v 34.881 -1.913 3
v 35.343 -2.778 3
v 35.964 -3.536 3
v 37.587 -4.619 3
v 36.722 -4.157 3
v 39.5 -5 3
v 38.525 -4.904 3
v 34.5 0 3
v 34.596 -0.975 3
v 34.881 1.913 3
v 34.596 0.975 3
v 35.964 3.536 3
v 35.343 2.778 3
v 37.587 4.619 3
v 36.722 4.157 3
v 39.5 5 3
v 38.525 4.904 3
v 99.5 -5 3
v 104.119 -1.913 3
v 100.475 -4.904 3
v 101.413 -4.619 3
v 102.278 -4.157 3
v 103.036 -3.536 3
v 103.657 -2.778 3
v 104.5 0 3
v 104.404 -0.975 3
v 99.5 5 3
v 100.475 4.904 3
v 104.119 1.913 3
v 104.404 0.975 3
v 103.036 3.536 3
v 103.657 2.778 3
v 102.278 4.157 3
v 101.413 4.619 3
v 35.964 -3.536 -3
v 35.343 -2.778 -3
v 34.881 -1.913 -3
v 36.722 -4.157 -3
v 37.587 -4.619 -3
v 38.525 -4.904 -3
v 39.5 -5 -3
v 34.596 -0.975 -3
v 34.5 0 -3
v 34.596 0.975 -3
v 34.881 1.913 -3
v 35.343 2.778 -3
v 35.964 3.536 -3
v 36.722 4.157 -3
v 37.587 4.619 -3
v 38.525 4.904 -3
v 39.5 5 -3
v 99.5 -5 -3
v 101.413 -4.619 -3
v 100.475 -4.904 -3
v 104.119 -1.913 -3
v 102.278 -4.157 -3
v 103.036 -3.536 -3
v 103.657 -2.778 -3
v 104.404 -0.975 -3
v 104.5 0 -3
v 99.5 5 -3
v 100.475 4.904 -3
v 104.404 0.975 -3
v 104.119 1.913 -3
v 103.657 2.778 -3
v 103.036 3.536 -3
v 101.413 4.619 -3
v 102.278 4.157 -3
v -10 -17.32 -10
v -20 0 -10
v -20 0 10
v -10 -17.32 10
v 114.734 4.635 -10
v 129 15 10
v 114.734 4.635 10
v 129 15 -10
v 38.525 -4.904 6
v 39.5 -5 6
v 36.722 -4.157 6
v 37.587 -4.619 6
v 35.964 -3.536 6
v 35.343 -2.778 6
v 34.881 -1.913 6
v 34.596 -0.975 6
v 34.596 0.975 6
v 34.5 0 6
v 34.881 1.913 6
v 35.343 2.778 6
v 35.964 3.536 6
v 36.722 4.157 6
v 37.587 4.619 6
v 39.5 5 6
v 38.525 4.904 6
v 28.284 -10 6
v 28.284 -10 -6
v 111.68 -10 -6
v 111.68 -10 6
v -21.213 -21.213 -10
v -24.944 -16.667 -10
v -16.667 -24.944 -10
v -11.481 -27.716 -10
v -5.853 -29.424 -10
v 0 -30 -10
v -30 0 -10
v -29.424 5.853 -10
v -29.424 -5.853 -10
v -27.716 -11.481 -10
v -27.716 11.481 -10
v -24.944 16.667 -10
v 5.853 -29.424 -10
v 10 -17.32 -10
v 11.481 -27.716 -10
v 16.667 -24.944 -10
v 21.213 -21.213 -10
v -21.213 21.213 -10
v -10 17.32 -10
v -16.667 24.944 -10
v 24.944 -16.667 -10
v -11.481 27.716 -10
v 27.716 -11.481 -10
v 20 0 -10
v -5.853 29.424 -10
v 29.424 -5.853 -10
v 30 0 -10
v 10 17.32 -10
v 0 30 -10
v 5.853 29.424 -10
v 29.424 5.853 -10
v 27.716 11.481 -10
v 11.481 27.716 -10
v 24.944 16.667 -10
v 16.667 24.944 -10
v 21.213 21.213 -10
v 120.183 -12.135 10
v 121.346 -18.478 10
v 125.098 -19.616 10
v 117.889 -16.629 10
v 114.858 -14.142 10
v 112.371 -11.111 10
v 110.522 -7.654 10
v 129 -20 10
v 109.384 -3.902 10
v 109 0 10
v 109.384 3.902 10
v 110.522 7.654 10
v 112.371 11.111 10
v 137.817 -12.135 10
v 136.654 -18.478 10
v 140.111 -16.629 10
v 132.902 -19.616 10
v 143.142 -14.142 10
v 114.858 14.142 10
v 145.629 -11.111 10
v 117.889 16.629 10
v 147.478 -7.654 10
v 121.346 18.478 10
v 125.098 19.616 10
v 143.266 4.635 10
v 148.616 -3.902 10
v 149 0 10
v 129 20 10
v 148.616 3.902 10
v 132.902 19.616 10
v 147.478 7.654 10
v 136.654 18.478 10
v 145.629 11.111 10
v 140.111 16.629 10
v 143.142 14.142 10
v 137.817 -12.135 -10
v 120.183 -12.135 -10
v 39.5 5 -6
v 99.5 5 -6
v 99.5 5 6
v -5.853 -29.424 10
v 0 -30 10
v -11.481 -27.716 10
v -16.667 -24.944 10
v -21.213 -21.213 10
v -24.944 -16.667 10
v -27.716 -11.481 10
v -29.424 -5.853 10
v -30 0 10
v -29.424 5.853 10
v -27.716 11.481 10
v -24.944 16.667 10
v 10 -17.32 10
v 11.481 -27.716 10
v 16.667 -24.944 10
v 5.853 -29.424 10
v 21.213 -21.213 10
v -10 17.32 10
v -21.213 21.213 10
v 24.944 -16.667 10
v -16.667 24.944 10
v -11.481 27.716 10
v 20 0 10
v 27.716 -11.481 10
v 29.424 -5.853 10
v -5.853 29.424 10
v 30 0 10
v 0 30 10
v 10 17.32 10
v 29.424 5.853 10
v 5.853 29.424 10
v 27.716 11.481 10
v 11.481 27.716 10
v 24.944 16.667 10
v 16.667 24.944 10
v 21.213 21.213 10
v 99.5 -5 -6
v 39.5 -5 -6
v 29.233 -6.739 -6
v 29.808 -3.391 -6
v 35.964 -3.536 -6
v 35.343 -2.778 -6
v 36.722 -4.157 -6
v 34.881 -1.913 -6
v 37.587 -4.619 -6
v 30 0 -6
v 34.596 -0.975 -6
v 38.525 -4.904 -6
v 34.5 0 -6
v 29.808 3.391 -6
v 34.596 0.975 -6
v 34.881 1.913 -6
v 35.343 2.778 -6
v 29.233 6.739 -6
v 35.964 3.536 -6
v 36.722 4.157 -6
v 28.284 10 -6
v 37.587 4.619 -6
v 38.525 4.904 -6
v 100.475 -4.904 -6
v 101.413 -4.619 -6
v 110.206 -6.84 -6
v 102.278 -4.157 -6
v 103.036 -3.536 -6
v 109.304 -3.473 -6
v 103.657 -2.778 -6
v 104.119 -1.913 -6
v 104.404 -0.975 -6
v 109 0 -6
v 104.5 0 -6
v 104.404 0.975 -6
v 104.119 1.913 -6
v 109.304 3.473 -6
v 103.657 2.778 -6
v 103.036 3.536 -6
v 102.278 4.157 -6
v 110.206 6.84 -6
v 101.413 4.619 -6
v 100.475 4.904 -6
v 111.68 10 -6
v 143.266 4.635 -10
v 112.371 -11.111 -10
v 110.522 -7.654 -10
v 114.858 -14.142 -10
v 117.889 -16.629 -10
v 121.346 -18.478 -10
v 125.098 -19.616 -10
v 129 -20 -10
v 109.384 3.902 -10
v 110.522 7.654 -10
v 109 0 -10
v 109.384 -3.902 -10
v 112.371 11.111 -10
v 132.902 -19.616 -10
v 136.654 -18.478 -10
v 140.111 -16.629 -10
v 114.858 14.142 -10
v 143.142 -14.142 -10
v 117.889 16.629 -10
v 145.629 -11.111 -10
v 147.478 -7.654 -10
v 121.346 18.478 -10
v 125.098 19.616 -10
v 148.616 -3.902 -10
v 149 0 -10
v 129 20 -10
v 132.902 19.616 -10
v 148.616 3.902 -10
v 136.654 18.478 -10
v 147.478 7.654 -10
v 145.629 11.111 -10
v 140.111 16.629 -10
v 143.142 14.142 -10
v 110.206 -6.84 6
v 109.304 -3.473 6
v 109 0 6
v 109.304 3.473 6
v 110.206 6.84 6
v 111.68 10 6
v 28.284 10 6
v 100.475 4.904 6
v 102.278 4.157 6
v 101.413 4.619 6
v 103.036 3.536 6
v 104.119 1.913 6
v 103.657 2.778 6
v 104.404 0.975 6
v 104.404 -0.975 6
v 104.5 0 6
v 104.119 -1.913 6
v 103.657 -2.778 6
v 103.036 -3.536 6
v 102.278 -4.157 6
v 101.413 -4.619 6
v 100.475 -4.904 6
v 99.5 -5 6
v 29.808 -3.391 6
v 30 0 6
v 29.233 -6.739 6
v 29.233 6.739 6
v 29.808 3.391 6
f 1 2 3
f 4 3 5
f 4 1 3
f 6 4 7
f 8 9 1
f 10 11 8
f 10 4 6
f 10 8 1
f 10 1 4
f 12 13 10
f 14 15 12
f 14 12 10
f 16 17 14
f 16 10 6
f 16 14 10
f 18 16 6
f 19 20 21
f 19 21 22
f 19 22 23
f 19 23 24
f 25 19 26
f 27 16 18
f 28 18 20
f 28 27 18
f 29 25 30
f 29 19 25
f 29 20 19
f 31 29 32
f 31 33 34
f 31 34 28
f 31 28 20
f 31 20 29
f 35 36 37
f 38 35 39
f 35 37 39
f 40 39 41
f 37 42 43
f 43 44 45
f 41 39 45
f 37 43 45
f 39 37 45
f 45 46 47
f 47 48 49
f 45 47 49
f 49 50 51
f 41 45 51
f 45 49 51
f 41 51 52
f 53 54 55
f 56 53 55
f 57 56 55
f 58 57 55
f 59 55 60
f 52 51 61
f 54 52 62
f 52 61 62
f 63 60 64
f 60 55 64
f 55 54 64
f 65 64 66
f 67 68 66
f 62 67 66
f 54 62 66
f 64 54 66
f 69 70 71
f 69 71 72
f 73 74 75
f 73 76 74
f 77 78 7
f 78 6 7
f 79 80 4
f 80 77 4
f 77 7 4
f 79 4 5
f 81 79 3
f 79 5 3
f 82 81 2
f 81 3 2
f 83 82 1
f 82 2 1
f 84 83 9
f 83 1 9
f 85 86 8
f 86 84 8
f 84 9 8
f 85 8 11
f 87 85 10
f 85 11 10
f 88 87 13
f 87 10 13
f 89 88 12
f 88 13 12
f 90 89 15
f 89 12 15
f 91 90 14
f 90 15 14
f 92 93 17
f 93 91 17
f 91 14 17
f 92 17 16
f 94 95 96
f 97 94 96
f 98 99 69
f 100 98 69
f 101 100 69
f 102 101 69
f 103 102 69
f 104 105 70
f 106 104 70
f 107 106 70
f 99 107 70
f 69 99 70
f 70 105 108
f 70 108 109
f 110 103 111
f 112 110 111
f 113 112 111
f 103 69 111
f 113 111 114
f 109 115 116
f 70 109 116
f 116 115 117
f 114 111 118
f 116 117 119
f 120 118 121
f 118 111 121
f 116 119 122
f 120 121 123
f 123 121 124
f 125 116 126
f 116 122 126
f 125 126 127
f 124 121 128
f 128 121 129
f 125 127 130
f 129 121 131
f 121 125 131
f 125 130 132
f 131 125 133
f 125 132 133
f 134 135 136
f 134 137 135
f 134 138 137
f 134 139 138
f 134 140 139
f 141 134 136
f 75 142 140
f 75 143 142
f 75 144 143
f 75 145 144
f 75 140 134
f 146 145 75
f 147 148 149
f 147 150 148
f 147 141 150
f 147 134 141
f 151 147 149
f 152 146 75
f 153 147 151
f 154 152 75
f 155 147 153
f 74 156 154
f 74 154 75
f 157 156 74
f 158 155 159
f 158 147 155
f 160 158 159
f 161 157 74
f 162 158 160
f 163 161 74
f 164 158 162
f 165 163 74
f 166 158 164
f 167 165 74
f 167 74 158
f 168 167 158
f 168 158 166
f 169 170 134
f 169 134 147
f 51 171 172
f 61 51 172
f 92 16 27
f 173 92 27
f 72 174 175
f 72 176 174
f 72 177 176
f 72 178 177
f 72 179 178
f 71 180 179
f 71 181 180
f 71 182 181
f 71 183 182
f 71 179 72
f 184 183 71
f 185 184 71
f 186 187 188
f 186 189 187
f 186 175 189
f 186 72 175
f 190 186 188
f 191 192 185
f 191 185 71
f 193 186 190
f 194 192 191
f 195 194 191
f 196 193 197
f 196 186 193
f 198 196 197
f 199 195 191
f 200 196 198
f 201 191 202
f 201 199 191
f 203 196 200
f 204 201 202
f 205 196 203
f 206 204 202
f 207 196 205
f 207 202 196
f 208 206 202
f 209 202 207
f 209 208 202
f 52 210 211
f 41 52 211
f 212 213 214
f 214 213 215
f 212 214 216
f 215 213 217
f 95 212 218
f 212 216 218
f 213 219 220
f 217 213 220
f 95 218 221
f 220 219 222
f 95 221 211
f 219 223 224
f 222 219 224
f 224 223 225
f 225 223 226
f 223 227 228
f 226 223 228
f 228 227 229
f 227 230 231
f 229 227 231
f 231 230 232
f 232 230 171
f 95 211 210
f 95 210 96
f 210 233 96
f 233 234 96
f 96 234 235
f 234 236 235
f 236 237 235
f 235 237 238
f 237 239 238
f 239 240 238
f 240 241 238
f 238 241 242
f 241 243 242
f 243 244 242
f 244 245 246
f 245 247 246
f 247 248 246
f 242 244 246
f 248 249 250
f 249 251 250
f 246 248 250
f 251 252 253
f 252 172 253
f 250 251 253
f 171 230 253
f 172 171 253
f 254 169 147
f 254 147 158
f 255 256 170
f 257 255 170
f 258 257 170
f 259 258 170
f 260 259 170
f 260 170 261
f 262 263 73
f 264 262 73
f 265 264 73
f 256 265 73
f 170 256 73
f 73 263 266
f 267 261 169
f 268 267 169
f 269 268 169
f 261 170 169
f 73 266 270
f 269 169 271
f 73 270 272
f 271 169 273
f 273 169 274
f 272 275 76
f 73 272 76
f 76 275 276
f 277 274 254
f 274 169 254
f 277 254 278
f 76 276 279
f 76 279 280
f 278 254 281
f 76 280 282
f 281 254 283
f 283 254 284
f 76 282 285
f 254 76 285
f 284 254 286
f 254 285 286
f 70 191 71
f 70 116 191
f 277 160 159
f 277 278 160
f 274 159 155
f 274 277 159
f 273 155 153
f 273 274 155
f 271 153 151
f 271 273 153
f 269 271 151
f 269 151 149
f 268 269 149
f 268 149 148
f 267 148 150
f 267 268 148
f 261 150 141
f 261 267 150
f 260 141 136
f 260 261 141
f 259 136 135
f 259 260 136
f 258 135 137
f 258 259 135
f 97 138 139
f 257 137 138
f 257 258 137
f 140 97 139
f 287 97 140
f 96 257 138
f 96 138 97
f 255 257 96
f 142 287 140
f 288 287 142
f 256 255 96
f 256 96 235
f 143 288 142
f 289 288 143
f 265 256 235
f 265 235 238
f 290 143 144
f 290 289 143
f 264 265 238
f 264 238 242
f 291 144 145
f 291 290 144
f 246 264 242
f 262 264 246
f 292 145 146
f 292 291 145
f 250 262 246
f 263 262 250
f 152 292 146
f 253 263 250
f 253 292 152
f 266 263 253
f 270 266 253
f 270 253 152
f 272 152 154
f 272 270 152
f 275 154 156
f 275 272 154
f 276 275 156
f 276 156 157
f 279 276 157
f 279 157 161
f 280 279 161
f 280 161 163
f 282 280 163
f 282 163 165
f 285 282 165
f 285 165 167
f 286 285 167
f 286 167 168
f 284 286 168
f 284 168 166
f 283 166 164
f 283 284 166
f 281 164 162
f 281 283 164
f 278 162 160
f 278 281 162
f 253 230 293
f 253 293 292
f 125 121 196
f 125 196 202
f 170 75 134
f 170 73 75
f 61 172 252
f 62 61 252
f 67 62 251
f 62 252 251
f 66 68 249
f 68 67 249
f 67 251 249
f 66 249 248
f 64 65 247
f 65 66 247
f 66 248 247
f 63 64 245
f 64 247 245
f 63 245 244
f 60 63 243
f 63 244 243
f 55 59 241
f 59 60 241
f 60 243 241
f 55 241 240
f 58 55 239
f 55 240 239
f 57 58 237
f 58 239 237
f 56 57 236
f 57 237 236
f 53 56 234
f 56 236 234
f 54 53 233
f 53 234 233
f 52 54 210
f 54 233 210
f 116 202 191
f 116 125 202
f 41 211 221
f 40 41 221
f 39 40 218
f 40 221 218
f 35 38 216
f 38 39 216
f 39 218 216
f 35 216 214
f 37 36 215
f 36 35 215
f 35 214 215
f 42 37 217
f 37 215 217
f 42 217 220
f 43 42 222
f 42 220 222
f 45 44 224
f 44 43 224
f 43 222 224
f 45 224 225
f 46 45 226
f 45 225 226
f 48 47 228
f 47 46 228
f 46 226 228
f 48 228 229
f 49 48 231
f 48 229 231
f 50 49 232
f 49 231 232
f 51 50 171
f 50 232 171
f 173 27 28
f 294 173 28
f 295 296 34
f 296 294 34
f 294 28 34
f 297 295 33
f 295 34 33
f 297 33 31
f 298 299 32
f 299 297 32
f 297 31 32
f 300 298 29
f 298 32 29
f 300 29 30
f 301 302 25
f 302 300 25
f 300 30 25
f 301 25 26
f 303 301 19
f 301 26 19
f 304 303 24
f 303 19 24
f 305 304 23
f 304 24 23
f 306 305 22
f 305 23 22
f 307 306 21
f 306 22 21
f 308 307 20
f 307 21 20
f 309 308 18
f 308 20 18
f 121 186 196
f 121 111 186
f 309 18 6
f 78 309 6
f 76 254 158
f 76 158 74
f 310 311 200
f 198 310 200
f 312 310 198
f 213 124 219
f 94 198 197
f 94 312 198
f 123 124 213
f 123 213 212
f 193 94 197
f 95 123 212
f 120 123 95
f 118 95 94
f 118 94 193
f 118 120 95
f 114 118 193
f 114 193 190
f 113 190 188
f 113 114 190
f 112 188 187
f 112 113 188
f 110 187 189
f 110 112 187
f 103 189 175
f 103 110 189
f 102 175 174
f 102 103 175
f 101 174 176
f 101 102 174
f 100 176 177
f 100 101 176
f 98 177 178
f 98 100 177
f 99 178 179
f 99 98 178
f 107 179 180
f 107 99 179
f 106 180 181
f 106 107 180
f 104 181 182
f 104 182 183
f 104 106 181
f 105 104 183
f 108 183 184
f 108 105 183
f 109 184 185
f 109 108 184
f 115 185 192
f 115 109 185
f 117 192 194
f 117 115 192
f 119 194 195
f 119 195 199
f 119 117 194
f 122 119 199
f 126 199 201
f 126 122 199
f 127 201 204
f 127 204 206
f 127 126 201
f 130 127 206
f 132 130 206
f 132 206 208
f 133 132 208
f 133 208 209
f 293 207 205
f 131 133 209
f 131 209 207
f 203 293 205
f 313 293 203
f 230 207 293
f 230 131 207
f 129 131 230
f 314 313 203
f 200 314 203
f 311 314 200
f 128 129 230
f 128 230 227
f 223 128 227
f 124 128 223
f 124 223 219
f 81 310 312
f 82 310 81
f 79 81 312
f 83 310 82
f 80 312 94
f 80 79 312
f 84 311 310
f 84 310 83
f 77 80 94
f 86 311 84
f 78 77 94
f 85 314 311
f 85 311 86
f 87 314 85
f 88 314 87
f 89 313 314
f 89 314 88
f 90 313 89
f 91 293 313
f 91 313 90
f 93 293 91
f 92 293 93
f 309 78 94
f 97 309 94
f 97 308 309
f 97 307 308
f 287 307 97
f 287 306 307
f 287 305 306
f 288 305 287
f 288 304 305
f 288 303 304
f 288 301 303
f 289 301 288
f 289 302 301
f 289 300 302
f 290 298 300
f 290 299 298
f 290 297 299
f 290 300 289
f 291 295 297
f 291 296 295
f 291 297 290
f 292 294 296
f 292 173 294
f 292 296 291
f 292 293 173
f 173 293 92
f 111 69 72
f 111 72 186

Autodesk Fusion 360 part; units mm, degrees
sketch "Sketch1" plane through (0, 0, 0) normal (0, 0, 1) x (1, 0, 0) in component "exercise 2"
  circle A0 centre (0, 0) radius 30
  line L0 (0, 0) -> (129, 0) construction
  circle A1 centre (129, 0) radius 20
  line L1 (0, 0) -> (0, 74.6683) construction
  line L2 (129, 0) -> (129, 70.5762) construction
  line L3 (-20, 0) -> (-10, -17.3205)
  line L4 (-10, -17.3205) -> (10, -17.3205)
  line L5 (10, -17.3205) -> (20, 0)
  line L6 (20, 0) -> (10, 17.3205)
  line L7 (10, 17.3205) -> (-10, 17.3205)
  line L8 (-10, 17.3205) -> (-20, 0)
  line L9 (129, 15) -> (114.7342, 4.6353)
  line L10 (114.7342, 4.6353) -> (120.1832, -12.1353)
  line L11 (120.1832, -12.1353) -> (137.8168, -12.1353)
  line L12 (137.8168, -12.1353) -> (143.2658, 4.6353)
  line L13 (143.2658, 4.6353) -> (129, 15)
  line L14 (30, 0) -> (31.5826, 0)
  line L15 (28.2843, 10) -> (111.6795, 10)
  line L16 (28.2843, -10) -> (111.6795, -10)
  line L17 (50, 10) -> (50, -10) construction
  line L18 (50, 0) -> (52, 0)
  line L19 (99.5, -5) -> (39.5, -5)
  line L20 (39.5, 5) -> (99.5, 5)
  line L21 (99.5, -5) -> (39.5, 5) construction
  line L22 (39.5, -5) -> (99.5, 5) construction
  arc A2 (41.1216, 4.7297) -> (41.1216, -4.7297) centre (39.5, 0) ccw
  arc A3 (97.8784, -4.7297) -> (97.8784, 4.7297) centre (99.5, 0) ccw
  point P0 (129, 0)
  point P1 (69.5, 0)
  dimension "d1" = 60
  dimension "d2" = 40
  dimension "d3" = 129
  dimension "d4" = 20
  dimension "d5" = 15
  dimension "d6" = 20
  dimension "d9" = 60
extrude "Extrude1" add sketch "Sketch1" along normal mid plane 20 contours A0 | A1 makes body 1 at (18.836, -10.4559, 10) makes body 2 at (148.9006, -1.9914, -3.3333) in component "exercise 2"
extrude "Extrude2" add sketch "Sketch1" along normal mid plane 12 contours A0 A1 L15 L16 bodies 1 2 in component "exercise 2"
extrude "Extrude3" add sketch "Sketch1" along normal mid plane 6 contours L19 L20 A2 A3 bodies 1 in component "exercise 2"
component "exercise 2" placed x (1, 0, 0) y (0, 1, 0) z (0, 0, 1) at (0, 0, 0)
